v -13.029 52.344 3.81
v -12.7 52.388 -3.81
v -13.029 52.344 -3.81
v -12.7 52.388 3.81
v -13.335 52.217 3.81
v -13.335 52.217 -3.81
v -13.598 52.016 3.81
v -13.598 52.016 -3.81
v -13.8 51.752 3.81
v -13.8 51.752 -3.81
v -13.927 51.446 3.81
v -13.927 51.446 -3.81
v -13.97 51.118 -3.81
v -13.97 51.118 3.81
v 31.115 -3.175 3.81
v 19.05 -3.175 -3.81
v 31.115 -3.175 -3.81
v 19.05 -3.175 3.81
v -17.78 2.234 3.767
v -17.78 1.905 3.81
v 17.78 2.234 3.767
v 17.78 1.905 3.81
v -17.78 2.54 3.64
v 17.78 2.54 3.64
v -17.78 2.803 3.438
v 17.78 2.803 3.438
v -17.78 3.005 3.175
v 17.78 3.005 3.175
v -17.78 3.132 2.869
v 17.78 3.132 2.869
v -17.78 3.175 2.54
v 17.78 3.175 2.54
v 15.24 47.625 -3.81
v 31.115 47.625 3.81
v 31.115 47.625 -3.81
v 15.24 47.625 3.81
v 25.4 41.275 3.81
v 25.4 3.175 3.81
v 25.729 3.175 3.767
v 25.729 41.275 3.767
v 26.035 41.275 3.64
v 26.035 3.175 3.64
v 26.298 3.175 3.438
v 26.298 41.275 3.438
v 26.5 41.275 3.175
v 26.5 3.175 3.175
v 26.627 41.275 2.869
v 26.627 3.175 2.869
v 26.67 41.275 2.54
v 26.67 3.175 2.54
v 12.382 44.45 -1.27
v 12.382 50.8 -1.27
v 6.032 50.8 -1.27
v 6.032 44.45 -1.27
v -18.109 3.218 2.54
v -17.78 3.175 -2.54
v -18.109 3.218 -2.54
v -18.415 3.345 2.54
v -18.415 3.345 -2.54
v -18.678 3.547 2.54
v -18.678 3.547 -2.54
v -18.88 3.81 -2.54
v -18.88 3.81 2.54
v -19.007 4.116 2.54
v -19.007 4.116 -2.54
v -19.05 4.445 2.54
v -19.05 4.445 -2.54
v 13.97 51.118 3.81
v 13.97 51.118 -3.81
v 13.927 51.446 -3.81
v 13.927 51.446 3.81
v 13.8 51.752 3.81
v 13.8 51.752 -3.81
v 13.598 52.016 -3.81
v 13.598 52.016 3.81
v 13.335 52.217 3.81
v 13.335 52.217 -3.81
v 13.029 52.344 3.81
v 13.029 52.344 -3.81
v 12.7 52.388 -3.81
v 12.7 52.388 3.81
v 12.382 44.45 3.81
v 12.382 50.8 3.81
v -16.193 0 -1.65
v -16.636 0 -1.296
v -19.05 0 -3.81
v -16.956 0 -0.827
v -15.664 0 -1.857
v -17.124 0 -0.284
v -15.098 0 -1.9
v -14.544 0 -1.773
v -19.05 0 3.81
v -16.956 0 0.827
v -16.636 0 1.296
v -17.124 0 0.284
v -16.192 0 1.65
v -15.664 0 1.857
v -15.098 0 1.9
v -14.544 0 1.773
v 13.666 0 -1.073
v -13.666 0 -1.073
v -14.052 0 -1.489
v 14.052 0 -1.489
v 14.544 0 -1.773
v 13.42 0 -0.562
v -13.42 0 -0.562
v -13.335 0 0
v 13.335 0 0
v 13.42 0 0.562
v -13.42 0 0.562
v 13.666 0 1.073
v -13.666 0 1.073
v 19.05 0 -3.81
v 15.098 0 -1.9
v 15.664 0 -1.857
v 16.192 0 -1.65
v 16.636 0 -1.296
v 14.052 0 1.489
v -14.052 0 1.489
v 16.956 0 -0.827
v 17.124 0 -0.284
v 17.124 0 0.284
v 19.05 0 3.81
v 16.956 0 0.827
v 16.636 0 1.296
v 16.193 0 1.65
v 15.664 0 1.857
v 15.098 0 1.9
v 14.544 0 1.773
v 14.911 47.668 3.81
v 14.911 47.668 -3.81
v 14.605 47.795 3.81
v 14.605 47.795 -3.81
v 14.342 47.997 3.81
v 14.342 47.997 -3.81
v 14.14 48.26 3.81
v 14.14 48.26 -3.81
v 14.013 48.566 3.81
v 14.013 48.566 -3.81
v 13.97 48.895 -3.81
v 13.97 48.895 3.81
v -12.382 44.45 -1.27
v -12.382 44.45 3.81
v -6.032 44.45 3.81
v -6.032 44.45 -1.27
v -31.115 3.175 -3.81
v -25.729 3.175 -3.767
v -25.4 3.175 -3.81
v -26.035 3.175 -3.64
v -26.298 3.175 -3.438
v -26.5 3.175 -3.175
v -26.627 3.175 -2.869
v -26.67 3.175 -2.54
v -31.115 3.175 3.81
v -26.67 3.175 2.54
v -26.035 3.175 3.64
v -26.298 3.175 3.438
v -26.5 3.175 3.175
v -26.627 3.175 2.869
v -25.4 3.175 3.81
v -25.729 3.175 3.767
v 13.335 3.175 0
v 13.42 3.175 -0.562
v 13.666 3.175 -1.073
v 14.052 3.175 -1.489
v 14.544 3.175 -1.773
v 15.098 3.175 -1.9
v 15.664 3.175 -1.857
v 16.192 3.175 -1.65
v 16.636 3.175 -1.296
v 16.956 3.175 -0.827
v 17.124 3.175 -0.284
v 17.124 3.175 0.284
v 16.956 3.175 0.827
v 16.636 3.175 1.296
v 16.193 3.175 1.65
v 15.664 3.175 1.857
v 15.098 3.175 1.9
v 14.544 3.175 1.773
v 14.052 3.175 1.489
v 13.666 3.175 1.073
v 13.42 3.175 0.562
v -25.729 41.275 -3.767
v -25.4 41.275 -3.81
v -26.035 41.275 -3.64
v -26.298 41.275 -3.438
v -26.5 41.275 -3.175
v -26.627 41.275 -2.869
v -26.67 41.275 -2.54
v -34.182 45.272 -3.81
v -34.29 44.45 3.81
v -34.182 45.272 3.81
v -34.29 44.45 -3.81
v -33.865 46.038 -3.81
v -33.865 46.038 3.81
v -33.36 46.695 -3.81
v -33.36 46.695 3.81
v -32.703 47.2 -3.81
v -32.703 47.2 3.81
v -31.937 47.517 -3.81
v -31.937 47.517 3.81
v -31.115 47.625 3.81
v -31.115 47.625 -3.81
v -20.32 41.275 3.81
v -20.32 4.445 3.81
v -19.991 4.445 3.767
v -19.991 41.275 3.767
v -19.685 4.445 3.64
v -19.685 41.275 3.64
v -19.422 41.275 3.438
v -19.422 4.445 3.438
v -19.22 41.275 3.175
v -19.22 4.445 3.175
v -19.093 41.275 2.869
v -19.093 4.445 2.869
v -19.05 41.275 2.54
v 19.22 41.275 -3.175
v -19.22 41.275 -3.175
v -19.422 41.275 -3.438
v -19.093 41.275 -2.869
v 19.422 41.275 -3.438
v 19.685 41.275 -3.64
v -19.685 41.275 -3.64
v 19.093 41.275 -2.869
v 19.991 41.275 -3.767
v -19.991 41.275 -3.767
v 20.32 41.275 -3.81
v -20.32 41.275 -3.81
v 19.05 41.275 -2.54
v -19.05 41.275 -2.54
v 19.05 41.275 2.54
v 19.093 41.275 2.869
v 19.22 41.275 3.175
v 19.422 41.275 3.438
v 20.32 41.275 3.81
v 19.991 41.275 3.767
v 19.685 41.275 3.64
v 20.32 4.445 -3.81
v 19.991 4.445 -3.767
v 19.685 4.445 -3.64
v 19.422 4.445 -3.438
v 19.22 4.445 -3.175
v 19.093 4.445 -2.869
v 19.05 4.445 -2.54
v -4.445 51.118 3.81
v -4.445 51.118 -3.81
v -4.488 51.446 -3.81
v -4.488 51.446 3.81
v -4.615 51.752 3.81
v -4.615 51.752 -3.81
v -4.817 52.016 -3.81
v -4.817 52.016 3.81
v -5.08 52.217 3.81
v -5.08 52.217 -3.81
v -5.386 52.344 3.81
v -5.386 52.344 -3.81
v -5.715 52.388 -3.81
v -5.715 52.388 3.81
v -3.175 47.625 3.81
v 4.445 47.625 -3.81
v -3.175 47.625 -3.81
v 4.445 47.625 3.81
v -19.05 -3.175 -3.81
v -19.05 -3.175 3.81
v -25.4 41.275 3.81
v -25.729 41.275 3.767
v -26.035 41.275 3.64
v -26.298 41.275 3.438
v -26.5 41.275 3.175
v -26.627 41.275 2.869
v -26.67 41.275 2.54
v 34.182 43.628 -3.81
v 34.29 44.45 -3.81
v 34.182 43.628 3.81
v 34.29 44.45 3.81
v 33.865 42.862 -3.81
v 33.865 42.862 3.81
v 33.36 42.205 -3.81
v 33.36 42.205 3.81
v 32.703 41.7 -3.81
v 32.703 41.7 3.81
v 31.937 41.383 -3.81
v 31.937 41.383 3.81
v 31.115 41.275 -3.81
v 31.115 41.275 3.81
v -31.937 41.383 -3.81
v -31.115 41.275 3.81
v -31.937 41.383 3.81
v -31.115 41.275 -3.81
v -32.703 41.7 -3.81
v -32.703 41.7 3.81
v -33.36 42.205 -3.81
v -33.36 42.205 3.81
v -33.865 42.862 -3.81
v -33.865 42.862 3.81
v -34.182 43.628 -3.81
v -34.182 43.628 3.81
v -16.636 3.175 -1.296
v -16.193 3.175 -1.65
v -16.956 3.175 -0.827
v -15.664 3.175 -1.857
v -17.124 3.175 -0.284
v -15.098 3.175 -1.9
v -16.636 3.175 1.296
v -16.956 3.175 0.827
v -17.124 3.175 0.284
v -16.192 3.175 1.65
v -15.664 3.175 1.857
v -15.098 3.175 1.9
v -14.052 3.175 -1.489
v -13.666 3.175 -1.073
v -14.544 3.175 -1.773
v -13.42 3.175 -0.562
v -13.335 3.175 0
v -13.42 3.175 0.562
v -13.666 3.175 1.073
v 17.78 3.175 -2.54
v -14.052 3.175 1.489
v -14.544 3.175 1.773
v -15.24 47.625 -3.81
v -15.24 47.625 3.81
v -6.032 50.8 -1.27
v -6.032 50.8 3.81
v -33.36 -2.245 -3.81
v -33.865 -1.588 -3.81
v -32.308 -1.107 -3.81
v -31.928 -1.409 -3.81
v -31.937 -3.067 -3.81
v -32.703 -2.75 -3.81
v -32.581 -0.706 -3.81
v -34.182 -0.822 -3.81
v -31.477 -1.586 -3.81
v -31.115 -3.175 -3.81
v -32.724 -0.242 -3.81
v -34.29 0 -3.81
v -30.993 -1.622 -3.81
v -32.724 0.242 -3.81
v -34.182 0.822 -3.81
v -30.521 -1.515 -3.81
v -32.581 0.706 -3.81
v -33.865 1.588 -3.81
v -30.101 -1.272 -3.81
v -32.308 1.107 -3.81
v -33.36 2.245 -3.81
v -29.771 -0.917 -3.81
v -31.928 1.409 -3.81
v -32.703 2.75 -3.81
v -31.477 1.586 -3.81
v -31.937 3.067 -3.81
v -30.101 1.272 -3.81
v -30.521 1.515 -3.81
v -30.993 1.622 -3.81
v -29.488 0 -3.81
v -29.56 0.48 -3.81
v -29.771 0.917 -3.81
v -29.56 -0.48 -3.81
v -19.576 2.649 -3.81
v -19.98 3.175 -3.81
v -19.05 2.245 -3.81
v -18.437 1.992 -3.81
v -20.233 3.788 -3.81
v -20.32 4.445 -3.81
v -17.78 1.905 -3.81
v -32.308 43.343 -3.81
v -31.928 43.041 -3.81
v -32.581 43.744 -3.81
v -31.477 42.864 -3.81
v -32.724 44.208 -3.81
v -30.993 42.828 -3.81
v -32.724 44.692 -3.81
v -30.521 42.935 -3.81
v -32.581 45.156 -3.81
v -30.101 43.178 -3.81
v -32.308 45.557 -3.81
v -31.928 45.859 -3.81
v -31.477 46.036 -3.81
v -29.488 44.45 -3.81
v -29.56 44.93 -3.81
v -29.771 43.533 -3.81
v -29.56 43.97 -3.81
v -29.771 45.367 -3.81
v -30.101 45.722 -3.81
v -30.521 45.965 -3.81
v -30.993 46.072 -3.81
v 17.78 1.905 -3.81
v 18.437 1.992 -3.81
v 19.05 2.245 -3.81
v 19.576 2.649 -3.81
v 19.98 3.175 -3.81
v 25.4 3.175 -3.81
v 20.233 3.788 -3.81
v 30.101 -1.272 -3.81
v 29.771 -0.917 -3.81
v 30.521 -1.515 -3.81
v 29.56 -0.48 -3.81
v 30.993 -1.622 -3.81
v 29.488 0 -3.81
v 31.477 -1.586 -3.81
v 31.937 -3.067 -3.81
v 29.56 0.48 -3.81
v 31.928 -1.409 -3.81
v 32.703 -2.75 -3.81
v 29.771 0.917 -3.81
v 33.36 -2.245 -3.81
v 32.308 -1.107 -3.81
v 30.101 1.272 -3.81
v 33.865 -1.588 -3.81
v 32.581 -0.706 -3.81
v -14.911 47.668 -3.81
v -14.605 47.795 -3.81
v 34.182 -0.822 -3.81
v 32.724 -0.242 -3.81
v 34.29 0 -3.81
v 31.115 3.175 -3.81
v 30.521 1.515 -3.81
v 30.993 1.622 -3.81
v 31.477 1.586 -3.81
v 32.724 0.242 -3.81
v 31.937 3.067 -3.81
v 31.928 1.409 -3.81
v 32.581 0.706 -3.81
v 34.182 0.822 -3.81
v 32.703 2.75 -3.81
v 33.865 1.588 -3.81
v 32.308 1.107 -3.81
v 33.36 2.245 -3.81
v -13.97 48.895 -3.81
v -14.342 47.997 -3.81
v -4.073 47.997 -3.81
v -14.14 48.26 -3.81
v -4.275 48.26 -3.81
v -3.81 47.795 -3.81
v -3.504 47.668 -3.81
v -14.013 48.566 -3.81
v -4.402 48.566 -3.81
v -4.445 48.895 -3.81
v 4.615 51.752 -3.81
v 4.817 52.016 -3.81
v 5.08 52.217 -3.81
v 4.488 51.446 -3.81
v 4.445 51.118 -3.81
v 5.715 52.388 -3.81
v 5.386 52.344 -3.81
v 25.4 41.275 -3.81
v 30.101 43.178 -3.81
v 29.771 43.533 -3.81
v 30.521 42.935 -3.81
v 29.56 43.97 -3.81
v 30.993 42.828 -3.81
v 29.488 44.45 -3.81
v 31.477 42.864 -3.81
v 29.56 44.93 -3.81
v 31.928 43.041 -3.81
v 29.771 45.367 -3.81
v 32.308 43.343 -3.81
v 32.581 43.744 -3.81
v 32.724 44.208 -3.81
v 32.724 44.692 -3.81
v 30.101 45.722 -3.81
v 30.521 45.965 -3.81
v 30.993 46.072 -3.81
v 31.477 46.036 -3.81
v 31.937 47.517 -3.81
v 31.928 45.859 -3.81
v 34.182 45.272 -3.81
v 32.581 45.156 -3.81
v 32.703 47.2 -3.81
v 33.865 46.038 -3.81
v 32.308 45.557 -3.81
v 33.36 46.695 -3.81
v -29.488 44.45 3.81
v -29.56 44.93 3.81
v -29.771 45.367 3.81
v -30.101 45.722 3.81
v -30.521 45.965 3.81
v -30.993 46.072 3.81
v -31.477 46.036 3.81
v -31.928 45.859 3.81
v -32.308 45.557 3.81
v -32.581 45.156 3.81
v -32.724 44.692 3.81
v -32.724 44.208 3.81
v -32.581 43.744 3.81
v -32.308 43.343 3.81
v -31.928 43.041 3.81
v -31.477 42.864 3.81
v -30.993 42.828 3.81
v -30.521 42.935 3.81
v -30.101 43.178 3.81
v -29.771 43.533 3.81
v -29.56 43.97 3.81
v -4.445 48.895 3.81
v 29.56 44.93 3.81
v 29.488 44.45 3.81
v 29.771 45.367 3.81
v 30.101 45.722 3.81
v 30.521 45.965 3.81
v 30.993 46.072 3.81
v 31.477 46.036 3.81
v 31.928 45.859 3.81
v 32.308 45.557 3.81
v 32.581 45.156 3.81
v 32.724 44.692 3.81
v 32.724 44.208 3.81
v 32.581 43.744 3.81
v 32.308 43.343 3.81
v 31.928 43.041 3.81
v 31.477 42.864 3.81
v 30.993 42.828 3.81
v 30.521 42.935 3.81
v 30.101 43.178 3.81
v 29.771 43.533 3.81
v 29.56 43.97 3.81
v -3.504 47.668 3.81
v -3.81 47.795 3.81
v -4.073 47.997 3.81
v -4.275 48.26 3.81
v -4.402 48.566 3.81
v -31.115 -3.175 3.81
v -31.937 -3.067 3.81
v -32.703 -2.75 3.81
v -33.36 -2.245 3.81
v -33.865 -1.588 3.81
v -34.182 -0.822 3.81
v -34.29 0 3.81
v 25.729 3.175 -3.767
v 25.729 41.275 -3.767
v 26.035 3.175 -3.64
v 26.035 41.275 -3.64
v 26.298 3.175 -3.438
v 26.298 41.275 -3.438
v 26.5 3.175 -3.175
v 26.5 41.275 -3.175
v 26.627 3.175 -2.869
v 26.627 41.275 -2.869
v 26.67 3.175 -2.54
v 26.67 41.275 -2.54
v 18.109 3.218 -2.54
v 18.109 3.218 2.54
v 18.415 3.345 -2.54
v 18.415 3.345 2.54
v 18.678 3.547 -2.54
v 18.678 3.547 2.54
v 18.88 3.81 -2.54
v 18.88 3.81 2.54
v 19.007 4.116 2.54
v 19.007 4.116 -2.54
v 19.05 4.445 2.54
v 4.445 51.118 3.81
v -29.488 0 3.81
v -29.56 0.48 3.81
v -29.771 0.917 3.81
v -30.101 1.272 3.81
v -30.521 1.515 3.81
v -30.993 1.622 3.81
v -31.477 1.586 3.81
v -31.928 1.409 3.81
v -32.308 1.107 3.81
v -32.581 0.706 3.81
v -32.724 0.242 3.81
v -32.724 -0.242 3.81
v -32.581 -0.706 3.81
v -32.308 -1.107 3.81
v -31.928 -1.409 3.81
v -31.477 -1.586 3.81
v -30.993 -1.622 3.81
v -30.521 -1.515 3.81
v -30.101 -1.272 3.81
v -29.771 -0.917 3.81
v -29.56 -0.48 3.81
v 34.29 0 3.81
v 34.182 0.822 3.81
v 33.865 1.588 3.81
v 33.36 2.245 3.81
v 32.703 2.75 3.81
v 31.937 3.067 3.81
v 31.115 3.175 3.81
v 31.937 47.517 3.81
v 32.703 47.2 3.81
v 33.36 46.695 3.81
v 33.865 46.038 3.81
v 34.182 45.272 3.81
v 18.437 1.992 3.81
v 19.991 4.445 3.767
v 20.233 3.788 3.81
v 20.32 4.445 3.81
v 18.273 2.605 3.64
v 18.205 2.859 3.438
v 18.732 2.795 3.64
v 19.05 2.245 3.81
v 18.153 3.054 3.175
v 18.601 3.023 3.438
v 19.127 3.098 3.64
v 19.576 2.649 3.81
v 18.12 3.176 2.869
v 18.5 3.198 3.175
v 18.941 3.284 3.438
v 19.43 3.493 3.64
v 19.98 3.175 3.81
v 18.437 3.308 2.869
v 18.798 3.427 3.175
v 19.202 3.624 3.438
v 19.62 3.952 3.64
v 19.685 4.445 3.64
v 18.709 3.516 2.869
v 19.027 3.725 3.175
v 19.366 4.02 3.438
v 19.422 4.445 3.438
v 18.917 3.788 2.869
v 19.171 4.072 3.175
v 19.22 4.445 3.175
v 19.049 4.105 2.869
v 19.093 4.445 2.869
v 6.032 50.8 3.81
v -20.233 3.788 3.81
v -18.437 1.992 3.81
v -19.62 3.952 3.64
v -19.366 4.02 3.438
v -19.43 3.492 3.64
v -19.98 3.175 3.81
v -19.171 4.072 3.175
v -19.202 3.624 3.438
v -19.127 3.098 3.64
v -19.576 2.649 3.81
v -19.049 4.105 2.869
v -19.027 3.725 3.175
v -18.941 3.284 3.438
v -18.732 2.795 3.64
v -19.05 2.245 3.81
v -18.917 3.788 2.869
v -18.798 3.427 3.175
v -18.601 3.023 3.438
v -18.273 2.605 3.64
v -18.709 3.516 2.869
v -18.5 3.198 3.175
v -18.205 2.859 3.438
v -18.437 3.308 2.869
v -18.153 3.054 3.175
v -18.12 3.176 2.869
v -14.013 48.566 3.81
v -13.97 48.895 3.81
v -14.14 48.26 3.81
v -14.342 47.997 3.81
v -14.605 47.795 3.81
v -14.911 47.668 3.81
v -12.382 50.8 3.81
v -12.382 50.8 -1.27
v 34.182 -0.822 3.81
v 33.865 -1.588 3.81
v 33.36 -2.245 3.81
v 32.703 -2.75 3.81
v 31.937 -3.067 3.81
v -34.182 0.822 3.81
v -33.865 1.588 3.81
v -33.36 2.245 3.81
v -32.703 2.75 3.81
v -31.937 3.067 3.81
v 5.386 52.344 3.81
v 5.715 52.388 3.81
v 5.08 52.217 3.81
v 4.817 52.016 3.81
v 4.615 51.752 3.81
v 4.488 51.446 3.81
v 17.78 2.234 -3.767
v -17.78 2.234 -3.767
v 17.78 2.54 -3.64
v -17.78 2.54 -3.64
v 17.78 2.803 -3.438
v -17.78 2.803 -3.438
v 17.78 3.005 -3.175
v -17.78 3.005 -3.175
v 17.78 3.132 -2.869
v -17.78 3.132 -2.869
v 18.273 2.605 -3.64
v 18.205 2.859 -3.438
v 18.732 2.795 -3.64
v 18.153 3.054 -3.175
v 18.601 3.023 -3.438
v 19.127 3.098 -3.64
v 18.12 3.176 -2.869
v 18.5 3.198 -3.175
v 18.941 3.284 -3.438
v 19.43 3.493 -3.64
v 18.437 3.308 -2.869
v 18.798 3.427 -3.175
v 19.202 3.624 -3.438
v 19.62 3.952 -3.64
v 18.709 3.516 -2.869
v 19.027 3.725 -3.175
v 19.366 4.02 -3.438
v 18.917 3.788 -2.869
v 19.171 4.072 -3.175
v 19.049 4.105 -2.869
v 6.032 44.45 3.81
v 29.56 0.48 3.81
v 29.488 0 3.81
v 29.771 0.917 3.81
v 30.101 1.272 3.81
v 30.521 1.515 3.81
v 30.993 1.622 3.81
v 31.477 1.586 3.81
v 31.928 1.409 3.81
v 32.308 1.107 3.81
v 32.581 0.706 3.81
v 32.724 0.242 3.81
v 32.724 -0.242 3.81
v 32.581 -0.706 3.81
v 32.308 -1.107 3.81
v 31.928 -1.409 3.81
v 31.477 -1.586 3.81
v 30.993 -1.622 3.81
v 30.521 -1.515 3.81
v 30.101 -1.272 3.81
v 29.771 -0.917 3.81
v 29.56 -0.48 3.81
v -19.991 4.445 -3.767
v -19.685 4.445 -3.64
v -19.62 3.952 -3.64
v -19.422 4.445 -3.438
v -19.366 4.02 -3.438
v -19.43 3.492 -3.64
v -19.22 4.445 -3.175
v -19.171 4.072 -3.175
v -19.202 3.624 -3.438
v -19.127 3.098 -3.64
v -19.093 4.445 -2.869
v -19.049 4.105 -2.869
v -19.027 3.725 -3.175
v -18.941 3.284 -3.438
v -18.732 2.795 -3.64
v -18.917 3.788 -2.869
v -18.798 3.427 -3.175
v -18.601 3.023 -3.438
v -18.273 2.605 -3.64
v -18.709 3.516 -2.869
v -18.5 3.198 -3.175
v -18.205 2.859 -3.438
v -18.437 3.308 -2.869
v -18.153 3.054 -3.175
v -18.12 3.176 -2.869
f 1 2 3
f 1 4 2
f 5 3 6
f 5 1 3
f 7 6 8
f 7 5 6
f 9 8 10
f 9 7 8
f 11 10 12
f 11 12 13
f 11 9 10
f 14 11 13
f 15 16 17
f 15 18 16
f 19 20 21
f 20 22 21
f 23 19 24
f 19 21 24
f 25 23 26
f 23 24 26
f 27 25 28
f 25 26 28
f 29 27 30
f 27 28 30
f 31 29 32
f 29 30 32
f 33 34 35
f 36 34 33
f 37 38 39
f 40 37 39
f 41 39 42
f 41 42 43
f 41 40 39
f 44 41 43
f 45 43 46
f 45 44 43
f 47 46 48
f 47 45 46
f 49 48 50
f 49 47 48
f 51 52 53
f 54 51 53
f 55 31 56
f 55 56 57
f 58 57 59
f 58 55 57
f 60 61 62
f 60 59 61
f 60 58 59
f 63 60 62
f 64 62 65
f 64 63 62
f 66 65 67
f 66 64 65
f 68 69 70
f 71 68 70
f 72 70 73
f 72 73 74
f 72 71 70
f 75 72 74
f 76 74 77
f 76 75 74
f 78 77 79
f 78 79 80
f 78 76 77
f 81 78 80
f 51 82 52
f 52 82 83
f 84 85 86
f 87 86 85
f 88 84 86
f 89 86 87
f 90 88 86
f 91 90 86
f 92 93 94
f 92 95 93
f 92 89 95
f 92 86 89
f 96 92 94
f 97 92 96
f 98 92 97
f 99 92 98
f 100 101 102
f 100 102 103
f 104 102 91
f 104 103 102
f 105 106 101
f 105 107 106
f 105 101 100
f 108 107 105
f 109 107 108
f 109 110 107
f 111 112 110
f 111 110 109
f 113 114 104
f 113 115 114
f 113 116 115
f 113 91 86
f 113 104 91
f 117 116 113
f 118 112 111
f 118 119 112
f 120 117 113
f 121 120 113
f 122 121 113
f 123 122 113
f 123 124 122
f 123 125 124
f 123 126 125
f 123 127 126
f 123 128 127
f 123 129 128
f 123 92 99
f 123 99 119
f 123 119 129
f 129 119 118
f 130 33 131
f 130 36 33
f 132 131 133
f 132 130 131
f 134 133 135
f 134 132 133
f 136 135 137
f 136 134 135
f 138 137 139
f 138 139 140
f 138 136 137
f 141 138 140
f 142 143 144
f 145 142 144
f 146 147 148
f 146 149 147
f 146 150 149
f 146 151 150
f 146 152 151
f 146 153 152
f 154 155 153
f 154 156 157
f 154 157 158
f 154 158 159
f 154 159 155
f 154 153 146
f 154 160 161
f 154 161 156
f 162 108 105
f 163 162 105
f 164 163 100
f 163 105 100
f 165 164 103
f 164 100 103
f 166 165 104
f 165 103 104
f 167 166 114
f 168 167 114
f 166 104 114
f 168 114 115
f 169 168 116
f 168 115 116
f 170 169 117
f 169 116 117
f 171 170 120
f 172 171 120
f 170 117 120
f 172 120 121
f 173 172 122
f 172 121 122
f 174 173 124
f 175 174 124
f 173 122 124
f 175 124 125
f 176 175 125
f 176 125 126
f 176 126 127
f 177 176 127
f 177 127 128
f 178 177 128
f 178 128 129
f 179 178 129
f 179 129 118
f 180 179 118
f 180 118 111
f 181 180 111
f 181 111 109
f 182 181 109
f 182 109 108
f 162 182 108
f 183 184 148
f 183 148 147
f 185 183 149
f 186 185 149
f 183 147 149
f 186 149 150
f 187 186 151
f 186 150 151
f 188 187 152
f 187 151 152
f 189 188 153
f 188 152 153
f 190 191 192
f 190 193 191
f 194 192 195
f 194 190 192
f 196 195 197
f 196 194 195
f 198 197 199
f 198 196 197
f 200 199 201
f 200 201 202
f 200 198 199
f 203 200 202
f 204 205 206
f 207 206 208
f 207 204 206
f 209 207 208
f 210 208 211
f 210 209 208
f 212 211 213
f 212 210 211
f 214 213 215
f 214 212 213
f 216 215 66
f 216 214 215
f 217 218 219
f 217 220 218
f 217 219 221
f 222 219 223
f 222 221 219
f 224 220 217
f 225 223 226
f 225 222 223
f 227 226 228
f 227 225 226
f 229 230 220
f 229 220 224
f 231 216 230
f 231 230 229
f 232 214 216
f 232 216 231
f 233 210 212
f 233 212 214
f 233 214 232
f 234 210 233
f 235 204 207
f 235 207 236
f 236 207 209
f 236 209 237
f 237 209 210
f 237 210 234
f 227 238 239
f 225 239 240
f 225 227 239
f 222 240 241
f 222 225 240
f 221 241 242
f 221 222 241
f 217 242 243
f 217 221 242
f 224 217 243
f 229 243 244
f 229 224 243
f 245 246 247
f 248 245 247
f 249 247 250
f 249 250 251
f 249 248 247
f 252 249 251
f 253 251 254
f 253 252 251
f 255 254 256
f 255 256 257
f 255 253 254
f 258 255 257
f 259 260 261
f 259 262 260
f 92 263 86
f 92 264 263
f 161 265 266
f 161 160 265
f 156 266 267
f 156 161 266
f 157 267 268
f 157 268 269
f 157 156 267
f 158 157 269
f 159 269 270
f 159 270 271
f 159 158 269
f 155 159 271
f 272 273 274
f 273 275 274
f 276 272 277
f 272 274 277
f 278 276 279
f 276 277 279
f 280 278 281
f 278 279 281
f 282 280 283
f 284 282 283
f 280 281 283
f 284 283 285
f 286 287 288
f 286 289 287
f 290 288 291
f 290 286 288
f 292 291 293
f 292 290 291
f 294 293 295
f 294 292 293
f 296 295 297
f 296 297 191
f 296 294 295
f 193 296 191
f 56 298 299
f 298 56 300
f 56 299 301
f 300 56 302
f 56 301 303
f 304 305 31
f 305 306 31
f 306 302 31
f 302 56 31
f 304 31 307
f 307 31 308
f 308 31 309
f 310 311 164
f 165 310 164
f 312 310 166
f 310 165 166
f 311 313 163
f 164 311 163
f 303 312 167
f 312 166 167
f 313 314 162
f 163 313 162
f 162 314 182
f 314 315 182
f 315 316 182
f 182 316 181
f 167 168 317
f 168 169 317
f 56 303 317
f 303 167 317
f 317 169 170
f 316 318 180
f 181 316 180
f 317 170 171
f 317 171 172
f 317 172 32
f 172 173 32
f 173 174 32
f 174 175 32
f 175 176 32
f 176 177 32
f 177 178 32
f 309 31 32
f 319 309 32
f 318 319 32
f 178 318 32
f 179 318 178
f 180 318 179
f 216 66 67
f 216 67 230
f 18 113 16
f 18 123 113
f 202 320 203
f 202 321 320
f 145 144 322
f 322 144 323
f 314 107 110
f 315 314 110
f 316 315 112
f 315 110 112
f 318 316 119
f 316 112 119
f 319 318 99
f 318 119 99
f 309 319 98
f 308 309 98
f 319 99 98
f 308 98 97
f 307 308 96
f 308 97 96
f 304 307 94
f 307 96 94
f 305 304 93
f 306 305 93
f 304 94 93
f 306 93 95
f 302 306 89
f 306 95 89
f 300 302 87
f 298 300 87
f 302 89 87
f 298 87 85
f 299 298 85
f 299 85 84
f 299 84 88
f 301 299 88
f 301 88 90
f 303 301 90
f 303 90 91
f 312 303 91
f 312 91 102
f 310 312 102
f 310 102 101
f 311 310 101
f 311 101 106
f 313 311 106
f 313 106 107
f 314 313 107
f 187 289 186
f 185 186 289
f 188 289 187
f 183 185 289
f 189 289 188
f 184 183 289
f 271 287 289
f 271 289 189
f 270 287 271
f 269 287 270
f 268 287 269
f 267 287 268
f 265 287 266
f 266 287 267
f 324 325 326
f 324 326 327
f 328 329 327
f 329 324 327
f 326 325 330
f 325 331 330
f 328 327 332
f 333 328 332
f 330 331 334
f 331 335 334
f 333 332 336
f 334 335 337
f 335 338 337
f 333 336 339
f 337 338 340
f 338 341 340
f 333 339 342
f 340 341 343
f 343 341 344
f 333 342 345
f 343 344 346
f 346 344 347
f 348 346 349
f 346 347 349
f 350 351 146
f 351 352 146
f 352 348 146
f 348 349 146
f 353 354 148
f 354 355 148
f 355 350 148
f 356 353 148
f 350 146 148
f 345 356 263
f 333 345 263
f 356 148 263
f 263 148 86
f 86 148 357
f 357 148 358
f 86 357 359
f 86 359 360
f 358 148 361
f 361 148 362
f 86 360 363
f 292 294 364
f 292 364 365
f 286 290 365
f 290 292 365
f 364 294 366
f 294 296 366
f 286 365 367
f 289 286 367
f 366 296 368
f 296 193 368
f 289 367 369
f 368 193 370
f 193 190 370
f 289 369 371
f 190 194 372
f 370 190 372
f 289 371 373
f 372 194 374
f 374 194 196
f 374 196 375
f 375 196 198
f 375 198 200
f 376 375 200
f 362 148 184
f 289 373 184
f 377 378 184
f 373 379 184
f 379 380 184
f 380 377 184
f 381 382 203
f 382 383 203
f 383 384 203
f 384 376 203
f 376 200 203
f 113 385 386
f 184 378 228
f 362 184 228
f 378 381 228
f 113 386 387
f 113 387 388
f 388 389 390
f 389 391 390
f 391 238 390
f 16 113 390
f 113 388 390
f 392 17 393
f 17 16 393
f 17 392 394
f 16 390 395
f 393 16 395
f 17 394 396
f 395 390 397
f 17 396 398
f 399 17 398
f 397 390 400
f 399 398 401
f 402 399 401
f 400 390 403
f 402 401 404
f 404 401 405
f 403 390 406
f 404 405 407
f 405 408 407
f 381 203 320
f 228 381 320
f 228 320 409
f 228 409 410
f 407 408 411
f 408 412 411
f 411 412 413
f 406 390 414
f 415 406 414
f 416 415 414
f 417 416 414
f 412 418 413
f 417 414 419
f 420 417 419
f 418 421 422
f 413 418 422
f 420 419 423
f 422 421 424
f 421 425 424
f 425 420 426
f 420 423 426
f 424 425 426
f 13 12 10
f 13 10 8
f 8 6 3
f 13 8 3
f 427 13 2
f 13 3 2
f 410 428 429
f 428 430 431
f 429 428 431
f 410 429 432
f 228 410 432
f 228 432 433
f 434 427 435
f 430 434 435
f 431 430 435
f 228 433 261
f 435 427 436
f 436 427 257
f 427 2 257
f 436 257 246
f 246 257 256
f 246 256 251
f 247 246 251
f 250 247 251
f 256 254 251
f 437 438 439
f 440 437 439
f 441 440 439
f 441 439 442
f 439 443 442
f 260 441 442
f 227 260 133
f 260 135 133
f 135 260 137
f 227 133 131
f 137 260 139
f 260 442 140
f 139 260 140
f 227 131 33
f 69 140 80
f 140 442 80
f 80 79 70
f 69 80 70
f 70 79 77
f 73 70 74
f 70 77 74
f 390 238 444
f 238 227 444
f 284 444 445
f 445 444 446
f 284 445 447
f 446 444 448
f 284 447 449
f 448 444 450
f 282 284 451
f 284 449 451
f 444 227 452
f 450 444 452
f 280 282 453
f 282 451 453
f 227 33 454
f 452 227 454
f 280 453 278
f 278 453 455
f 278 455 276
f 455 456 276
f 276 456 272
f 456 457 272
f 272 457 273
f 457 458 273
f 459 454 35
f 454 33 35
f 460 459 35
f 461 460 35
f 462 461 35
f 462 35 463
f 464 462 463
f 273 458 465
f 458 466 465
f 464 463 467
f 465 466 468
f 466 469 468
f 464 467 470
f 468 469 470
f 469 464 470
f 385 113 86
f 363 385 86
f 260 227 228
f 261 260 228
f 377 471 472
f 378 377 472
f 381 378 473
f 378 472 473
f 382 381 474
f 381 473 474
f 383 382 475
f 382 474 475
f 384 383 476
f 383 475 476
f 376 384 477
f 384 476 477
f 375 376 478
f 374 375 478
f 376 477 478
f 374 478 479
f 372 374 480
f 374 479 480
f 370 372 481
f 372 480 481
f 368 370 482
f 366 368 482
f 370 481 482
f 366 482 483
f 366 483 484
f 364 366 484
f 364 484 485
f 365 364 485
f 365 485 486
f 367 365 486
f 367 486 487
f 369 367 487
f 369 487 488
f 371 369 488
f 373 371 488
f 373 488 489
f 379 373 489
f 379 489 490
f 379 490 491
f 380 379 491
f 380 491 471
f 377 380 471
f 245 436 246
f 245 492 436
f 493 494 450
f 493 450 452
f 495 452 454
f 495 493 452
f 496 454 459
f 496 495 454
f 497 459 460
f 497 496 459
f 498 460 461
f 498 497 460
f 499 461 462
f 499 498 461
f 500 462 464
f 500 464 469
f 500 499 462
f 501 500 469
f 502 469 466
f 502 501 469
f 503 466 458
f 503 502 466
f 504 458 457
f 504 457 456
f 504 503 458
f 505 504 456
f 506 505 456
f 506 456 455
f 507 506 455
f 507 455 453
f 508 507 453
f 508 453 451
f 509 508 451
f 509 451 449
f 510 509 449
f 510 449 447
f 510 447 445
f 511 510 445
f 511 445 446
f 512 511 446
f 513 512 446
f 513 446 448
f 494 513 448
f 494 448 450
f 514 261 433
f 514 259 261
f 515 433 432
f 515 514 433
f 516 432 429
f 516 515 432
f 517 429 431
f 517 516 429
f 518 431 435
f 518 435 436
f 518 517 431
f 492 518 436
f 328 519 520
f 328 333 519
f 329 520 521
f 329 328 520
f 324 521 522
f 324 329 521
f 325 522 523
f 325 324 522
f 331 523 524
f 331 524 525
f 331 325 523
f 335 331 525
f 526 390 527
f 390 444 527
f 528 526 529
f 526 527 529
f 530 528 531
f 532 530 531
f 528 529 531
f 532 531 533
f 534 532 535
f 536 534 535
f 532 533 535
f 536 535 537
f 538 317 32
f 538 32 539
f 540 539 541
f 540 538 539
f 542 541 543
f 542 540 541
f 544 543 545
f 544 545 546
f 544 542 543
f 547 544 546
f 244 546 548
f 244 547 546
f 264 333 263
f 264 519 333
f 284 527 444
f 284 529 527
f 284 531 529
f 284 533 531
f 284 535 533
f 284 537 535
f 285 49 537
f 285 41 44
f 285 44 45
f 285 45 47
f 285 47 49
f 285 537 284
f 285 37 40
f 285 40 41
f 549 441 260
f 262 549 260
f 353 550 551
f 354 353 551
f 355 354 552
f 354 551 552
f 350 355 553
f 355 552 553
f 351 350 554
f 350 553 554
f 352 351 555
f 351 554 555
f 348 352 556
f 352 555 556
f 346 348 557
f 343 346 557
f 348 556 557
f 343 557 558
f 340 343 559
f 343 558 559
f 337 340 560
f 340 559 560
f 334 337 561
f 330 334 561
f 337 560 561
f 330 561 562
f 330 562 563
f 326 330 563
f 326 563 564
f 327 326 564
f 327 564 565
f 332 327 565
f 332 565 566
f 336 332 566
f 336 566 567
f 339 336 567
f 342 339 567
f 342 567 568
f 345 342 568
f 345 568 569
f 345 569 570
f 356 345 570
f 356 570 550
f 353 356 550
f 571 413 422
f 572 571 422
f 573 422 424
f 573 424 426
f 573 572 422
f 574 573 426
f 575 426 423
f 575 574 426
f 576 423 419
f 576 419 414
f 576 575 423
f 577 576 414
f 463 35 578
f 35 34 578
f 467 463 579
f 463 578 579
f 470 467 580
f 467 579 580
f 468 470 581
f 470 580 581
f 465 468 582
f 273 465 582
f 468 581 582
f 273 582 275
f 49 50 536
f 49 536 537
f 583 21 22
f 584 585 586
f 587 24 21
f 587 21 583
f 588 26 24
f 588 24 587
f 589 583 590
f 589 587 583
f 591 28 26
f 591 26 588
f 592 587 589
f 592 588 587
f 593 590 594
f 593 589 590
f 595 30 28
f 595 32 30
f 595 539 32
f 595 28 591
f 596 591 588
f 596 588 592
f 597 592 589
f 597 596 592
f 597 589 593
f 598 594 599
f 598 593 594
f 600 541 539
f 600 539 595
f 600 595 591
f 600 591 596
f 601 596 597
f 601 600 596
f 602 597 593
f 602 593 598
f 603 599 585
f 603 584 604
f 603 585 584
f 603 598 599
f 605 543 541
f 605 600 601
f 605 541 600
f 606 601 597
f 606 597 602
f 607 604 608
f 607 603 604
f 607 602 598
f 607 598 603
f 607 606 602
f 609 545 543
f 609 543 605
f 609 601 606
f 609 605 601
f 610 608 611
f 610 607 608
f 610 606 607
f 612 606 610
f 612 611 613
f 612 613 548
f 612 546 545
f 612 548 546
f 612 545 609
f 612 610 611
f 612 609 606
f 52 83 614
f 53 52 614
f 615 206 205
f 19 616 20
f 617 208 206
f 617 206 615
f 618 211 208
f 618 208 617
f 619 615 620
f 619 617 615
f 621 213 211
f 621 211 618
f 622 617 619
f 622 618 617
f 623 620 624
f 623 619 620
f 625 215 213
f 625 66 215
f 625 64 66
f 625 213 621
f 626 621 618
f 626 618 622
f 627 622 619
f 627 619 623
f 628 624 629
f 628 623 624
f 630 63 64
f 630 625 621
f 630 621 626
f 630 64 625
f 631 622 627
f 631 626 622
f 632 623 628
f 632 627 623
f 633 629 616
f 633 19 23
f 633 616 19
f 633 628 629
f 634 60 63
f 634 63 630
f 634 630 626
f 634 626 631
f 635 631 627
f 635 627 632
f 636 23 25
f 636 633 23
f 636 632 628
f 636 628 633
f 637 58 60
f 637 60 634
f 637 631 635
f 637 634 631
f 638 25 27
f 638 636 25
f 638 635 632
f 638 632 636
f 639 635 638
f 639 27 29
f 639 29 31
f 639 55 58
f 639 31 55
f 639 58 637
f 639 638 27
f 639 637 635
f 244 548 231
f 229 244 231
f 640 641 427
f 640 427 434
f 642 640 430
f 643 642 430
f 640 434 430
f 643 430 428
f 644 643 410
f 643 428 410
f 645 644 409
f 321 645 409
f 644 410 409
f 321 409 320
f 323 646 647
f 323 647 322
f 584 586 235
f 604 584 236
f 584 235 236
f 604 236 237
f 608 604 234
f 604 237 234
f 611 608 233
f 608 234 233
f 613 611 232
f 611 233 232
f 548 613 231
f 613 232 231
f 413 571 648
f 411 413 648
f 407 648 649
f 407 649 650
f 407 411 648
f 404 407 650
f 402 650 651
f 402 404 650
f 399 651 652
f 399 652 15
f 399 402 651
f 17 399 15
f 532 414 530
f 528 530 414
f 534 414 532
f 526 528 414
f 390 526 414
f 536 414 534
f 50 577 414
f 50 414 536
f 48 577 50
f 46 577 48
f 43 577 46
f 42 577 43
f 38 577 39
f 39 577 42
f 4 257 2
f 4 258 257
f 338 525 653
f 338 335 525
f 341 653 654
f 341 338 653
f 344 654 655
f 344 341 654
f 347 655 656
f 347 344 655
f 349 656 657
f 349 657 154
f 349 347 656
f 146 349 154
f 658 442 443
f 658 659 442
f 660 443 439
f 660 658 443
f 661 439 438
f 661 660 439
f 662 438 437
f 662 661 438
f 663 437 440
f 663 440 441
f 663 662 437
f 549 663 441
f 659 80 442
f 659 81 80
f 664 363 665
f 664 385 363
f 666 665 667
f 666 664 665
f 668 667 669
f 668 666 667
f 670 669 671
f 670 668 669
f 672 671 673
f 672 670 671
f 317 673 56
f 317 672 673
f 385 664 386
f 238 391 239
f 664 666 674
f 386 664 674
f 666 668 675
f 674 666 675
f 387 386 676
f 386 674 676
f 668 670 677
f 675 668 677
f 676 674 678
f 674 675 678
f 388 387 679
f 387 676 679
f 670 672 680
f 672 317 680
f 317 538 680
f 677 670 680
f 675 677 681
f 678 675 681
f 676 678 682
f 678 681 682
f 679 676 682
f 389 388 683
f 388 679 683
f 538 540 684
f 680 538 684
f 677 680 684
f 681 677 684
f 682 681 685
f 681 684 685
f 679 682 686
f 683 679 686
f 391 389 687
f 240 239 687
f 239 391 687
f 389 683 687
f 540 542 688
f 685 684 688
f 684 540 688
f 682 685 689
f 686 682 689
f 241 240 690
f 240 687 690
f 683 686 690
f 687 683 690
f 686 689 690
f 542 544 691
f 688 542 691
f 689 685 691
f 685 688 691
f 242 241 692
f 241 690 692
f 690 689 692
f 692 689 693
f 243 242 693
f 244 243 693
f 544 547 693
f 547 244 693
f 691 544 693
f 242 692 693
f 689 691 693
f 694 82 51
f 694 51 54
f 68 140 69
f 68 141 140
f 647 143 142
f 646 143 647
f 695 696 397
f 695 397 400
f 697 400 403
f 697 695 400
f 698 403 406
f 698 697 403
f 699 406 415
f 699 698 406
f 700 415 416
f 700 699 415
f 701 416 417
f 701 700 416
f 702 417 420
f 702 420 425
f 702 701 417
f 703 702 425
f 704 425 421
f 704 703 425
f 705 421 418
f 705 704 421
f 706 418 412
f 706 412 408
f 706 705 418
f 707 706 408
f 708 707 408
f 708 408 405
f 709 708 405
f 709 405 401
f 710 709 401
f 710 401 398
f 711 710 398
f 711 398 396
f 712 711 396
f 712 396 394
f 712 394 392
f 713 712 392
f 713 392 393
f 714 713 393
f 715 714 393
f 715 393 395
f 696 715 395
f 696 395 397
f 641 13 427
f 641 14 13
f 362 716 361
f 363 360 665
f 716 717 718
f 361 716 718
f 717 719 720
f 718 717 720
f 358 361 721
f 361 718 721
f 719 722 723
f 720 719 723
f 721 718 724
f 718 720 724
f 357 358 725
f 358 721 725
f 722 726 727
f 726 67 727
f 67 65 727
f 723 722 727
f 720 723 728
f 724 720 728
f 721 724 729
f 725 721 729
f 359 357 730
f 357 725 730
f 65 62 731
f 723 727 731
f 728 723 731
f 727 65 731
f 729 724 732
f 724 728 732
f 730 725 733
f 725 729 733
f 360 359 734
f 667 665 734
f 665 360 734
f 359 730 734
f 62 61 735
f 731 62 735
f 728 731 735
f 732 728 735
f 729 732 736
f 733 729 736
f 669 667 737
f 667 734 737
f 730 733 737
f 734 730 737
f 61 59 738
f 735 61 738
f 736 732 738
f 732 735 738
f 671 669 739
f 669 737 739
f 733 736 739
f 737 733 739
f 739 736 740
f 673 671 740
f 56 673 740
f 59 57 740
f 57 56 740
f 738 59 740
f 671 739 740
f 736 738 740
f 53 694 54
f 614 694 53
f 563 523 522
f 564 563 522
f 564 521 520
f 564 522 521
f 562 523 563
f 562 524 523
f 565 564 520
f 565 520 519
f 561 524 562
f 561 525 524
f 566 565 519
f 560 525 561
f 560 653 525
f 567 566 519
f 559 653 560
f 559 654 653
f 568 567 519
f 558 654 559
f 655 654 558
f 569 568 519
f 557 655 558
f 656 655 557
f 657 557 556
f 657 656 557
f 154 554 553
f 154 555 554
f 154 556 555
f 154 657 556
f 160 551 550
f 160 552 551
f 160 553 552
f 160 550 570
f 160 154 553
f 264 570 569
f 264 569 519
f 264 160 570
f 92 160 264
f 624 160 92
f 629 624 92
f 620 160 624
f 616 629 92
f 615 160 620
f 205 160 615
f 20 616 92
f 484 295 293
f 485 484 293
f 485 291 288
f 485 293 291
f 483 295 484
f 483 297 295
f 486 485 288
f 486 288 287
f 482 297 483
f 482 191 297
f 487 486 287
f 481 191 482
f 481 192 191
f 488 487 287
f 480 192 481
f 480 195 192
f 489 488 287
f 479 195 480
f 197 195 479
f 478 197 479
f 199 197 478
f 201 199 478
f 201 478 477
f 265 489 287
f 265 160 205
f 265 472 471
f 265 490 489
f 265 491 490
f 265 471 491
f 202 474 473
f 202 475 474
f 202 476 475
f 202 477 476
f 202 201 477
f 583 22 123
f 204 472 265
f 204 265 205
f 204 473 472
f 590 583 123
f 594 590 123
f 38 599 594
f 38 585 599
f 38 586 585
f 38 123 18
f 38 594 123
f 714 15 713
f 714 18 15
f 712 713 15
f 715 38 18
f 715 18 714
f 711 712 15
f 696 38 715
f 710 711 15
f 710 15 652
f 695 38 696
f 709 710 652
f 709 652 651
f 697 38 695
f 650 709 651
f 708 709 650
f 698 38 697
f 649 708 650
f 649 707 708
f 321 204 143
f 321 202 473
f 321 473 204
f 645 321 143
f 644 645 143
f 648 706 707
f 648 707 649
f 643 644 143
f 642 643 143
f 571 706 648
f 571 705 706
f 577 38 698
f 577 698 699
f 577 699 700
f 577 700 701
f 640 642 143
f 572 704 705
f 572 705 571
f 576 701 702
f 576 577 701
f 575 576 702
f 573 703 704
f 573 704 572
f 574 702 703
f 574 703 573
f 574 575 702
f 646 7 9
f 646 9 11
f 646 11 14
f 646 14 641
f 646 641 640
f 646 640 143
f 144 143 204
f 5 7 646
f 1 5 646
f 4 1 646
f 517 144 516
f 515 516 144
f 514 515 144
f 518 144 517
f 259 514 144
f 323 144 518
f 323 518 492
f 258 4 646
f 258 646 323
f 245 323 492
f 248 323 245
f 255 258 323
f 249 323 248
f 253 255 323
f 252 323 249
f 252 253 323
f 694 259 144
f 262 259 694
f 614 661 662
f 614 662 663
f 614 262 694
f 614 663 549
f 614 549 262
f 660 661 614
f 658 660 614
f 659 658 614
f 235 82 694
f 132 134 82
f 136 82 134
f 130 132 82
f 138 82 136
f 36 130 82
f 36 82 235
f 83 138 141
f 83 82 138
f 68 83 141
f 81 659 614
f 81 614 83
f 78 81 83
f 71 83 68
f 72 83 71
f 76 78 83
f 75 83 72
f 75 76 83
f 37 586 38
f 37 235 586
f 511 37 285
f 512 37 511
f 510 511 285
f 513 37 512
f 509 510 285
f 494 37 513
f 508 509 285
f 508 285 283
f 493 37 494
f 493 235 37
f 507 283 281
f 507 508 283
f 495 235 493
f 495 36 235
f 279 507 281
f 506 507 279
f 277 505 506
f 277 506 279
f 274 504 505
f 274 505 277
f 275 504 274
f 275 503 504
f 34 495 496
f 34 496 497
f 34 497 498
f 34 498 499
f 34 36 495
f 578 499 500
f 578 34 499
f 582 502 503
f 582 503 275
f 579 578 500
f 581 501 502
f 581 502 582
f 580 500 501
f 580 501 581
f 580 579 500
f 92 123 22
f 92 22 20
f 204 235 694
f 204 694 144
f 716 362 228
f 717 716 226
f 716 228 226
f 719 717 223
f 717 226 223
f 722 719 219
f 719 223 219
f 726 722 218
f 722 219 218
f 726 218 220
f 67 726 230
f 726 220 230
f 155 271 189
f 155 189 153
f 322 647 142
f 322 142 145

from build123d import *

# Parameters (mm, degrees)
SKETCH3_W           = 38.1
SKETCH3_H           = 38.1
BOSS_EXTRUDE2_DEPTH = 3.81
FILLET1_R           = 3.175
CUT_EXTRUDE1_REACH  = 65.074
SKETCH4_R           = 1.627
FILLET2_R           = 1.27
CUT_EXTRUDE2_REACH  = 64.728
SKETCH5_R           = 1.905
SKETCH7_W           = 6.35
SKETCH7_H           = 6.35
CUT_EXTRUDE4_DEPTH  = 5.08


with BuildPart() as part:
    # Sketch3 → Boss-Extrude2 (new, symmetric)
    with BuildSketch(Plane.XY):
        Polygon((34.29, -3.175), (34.29, 3.175), (26.67, 3.175), (26.67, 41.275), (34.29, 41.275), (34.29, 47.625), (13.97, 47.625), (13.97, 52.3875), (4.445, 52.3875), (4.445, 47.625), (-4.445, 47.625), (-4.445, 52.3875), (-13.97, 52.3875), (-13.97, 47.625), (-34.29, 47.625), (-34.29, 41.275), (-26.67, 41.275), (-26.67, 3.175), (-34.29, 3.175), (-34.29, -3.175), (-19.05, -3.175), (-19.05, 0), (19.05, 0), (19.05, -3.175), align=None)
        with Locations((0, 22.225)):
            Rectangle(SKETCH3_W, SKETCH3_H, mode=Mode.SUBTRACT)
    extrude(amount=BOSS_EXTRUDE2_DEPTH, both=True)

    # Fillet1
    fillet1_edges = [part.edges().sort_by_distance(p)[0] for p in [
        (34.29, 3.175, 0),
        (34.29, 41.275, 0),
        (34.29, 47.625, 0),
        (-34.29, 3.175, 0),
        (-34.29, 41.275, 0),
        (34.29, -3.175, 0),
        (-34.29, -3.175, 0),
        (-34.29, 47.625, 0),
    ]]
    fillet(fillet1_edges, radius=FILLET1_R - 0.0001)  # a hair under: the kernel refuses the full size

    # Sketch4 → Cut-Extrude1 (cut, up to next)
    with BuildSketch(Plane.XY.offset(3.81), mode=Mode.PRIVATE) as cut_extrude1_sk1:
        with Locations((-31.115, 44.45)):
            Circle(SKETCH4_R)
    cut_extrude1_tool1 = extrude(cut_extrude1_sk1.sketch, amount=-CUT_EXTRUDE1_REACH, mode=Mode.PRIVATE) & part.part
    # Sketch4 → Cut-Extrude1 (cut, up to next)
    with BuildSketch(Plane.XY.offset(3.81), mode=Mode.PRIVATE) as cut_extrude1_sk2:
        with Locations((-31.115, 0)):
            Circle(SKETCH4_R)
    cut_extrude1_tool2 = extrude(cut_extrude1_sk2.sketch, amount=-CUT_EXTRUDE1_REACH, mode=Mode.PRIVATE) & part.part
    cut_extrude1_1 = cut_extrude1_tool1.solids().sort_by_distance((-31.115, 44.45, 3.81))[0]
    add(cut_extrude1_1, mode=Mode.SUBTRACT)
    cut_extrude1_2 = cut_extrude1_tool2.solids().sort_by_distance((-31.115, 0, 3.81))[0]
    add(cut_extrude1_2, mode=Mode.SUBTRACT)
    cut_extrude1 = cut_extrude1_1 + cut_extrude1_2  # Cut-Extrude1 as one shape, for the pattern or mirror that repeats it

    # Mirror1: Cut-Extrude1 across plane
    add(cut_extrude1.mirror(Plane(origin=(0, 0, 0), x_dir=(0, 0, 1), z_dir=(1, 0, 0))), mode=Mode.SUBTRACT)

    # Fillet2
    fillet2_edges = [part.edges().sort_by_distance(p)[0] for p in [
        (-26.67, 22.225, -3.81),
        (26.67, 22.225, -3.81),
        (-13.97, 47.625, 0),
        (-13.97, 52.3875, 0),
        (-4.445, 52.3875, 0),
        (-4.445, 47.625, 0),
        (4.445, 52.3875, 0),
        (13.97, 52.3875, 0),
        (26.67, 22.225, 3.81),
        (13.97, 47.625, 0),
        (-19.05, 22.225, -3.81),
        (0, 3.175, -3.81),
        (-19.05, 3.175, 0),
        (19.05, 22.225, -3.81),
        (19.05, 3.175, 0),
        (-19.05, 22.225, 3.81),
        (0, 3.175, 3.81),
        (19.05, 22.225, 3.81),
        (-26.67, 22.225, 3.81),
    ]]
    fillet(fillet2_edges, radius=FILLET2_R)

    # Sketch5 → Cut-Extrude2 (cut, up to next)
    with BuildSketch(Plane.XZ, mode=Mode.PRIVATE) as cut_extrude2_sk1:
        with Locations((-15.24, 0)):
            Circle(SKETCH5_R)
    cut_extrude2_tool1 = extrude(cut_extrude2_sk1.sketch, amount=-CUT_EXTRUDE2_REACH, mode=Mode.PRIVATE) & part.part
    # Sketch5 → Cut-Extrude2 (cut, up to next)
    with BuildSketch(Plane.XZ, mode=Mode.PRIVATE) as cut_extrude2_sk2:
        with Locations(Location((15.24, 0, 0), (0, 0, 180))):
            Circle(SKETCH5_R)
    cut_extrude2_tool2 = extrude(cut_extrude2_sk2.sketch, amount=-CUT_EXTRUDE2_REACH, mode=Mode.PRIVATE) & part.part
    add(cut_extrude2_tool1.solids().sort_by_distance((-15.24, 0, 0))[0], mode=Mode.SUBTRACT)
    add(cut_extrude2_tool2.solids().sort_by_distance((15.24, 0, 0))[0], mode=Mode.SUBTRACT)

    # Sketch7 → Cut-Extrude4 (cut)
    with BuildSketch(Plane.XY.offset(3.81)):
        with Locations((-9.2075, 47.625)):
            Rectangle(SKETCH7_W, SKETCH7_H)
    cut_extrude4 = extrude(amount=-CUT_EXTRUDE4_DEPTH, mode=Mode.SUBTRACT)

    # Mirror2: Cut-Extrude4 across plane
    add(cut_extrude4.mirror(Plane(origin=(0, 0, 0), x_dir=(0, 0, 1), z_dir=(1, 0, 0))), mode=Mode.SUBTRACT)


solid = part.part
